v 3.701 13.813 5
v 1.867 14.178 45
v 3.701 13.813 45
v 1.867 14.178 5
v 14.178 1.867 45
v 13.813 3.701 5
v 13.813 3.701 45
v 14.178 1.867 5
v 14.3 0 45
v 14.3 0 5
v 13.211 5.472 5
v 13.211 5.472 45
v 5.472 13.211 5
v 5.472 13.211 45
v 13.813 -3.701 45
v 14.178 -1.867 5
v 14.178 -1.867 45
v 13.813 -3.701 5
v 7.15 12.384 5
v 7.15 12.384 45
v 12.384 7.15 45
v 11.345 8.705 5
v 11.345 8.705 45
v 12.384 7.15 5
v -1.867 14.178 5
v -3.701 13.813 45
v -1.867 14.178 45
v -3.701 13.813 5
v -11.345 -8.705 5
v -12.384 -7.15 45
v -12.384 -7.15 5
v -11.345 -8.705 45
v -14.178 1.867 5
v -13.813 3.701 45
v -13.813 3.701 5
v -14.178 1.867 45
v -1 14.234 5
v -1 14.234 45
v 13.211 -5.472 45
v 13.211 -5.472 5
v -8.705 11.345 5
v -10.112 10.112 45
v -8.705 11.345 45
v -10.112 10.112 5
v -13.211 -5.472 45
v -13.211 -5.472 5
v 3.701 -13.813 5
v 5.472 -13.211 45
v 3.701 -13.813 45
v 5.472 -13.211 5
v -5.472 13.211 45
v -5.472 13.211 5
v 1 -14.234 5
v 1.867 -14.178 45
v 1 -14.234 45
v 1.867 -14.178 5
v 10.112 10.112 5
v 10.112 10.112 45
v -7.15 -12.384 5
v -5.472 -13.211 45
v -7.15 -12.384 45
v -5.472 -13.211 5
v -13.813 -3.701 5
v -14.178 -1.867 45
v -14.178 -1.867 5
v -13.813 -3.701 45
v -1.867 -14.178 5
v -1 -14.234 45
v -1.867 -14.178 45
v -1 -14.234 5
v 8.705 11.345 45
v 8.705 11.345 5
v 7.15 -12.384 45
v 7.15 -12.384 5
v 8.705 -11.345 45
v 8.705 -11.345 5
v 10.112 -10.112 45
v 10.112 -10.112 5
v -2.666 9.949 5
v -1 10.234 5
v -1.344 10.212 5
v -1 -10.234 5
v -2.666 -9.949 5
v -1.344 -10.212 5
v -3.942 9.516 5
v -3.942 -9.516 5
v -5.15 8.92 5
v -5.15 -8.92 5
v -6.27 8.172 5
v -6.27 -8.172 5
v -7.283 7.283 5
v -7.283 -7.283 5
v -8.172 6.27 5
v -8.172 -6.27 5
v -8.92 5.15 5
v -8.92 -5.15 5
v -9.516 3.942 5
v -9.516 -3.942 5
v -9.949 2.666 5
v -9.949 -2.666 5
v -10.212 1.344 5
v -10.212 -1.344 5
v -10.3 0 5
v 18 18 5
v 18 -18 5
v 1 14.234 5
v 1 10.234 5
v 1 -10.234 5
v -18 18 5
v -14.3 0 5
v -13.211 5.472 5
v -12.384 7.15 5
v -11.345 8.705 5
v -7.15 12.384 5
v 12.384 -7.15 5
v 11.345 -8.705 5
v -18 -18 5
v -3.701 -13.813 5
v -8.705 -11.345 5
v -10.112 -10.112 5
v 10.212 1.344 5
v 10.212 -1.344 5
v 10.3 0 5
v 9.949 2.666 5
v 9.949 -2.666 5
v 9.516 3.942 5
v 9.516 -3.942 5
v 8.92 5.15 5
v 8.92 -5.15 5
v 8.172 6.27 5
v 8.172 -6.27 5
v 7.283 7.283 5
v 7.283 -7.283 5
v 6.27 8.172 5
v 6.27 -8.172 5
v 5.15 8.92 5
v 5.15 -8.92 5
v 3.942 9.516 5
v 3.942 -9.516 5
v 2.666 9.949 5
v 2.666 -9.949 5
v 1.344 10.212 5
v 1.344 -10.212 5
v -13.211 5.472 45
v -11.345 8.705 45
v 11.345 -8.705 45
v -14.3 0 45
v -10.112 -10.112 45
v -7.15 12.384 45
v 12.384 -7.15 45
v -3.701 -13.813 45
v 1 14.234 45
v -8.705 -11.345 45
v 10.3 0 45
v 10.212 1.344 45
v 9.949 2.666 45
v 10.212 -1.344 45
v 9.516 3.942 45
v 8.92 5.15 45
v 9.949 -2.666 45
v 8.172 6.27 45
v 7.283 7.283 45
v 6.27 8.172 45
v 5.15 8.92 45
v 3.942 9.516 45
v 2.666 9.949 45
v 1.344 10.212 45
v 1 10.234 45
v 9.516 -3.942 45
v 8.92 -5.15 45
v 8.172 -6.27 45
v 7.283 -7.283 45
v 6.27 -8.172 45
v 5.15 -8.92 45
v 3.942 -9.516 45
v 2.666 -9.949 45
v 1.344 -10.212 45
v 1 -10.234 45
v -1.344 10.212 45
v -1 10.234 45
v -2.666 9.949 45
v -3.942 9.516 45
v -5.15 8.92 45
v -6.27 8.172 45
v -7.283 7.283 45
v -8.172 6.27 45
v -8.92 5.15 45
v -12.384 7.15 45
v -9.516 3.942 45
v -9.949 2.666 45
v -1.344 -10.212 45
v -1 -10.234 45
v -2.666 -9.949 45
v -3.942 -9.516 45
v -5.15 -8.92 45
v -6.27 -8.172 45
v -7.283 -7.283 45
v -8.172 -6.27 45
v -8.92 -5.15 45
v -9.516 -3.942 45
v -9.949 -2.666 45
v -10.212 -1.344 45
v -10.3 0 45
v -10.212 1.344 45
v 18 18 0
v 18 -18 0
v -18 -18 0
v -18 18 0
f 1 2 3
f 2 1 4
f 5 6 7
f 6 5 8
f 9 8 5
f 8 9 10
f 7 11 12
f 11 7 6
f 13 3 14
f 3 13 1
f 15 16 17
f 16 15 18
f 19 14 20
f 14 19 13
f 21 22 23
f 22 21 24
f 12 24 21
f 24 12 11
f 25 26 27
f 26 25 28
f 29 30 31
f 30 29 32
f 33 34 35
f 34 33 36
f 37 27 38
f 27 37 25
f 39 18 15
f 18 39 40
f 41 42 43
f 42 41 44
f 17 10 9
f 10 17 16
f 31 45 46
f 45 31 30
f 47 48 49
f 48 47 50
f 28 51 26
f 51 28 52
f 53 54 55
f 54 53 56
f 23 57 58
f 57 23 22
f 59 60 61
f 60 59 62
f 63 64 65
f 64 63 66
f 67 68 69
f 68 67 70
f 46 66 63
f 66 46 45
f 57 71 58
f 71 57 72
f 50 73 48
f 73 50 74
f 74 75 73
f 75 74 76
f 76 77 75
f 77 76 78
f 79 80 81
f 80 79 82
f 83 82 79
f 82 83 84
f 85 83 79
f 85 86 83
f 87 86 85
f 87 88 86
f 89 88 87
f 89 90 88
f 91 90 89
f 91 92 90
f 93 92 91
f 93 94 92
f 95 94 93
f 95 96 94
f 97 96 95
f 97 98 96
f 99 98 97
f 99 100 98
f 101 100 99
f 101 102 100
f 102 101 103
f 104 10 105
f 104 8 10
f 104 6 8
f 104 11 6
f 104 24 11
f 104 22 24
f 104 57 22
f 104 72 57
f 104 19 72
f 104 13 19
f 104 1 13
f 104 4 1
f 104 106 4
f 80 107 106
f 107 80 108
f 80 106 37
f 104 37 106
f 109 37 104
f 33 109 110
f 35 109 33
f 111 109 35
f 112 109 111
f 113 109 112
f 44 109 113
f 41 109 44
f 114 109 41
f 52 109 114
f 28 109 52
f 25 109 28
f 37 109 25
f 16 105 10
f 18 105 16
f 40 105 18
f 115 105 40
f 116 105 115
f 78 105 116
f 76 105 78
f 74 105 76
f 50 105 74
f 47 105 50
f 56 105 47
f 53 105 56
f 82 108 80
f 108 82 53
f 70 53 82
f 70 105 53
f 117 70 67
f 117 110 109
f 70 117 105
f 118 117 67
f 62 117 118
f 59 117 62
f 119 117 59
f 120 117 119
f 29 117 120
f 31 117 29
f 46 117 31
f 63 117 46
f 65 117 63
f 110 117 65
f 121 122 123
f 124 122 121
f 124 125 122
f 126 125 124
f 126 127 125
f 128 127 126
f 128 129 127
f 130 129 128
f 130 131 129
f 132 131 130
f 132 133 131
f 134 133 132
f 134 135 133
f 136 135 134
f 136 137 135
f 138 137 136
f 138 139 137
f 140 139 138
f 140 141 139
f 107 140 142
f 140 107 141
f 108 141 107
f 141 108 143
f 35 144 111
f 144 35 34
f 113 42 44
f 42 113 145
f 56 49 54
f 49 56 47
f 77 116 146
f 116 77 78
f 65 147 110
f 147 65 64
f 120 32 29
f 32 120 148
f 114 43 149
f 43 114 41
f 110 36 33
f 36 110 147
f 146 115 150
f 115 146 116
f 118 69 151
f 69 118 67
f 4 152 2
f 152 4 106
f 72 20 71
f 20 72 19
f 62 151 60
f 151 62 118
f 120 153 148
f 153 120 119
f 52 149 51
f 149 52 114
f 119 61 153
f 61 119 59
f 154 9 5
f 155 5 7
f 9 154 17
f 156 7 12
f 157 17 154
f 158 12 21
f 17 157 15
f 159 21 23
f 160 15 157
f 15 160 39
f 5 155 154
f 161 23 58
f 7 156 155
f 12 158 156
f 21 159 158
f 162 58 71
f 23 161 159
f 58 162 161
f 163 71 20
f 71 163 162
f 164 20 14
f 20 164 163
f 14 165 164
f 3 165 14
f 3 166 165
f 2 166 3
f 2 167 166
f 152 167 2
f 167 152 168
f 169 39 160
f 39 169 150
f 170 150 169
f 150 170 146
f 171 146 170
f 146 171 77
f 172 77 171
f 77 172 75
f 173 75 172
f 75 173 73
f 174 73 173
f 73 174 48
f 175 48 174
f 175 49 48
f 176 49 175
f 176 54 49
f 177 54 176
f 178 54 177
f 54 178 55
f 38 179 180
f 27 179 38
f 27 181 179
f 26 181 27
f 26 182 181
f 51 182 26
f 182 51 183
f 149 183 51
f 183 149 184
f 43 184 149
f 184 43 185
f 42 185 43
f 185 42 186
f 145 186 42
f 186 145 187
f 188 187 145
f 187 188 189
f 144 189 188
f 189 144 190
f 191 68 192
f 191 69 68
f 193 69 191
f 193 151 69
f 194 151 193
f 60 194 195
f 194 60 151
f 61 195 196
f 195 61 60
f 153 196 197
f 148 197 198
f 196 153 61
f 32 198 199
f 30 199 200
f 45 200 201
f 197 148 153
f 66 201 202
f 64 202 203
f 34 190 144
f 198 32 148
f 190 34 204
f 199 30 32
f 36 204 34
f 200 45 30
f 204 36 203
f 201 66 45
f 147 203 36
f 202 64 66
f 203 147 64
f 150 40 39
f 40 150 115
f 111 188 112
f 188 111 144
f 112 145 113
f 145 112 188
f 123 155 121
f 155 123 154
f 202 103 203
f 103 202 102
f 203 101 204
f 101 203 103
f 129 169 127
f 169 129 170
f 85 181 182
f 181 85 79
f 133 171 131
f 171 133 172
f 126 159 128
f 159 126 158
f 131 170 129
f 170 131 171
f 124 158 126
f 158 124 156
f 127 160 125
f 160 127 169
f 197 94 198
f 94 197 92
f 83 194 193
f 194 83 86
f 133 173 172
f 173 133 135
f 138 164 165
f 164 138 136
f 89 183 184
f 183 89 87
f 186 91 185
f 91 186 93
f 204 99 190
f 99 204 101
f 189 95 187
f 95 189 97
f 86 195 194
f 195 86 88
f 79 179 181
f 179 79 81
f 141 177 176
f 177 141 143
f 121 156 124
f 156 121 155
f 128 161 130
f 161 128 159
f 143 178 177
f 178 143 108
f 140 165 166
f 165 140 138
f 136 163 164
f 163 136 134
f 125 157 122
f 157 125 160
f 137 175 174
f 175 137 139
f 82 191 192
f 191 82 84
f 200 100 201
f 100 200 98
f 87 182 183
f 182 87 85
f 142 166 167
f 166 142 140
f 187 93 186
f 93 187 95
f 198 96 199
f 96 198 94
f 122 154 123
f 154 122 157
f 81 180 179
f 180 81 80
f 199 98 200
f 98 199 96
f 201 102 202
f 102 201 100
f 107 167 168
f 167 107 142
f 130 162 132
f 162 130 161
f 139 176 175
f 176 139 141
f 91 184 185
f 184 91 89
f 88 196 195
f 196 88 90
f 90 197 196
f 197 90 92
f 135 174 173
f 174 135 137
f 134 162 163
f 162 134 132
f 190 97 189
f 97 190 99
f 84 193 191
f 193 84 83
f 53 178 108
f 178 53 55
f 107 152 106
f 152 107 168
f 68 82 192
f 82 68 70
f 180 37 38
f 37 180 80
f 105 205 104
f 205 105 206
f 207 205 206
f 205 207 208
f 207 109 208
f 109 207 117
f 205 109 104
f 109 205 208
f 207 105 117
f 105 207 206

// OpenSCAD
// Pipette mount — barrel clamp for digital-pipette-v2 on SO-101 wrist
// Port of hardware/cad/pipette_mount.py
// Regenerate: openscad -o hardware/stl/pipette_mount_so101.stl hardware/scad/pipette_mount.scad

// Parameters (mm)
BARREL_DIAMETER  = 20.0;
BARREL_CLEARANCE = 0.3;
CLAMP_LENGTH     = 40.0;
CLAMP_WALL       = 4.0;
MOUNT_WIDTH      = 36.0;
MOUNT_THICKNESS  = 5.0;
SPLIT_GAP        = 2.0;
SCREW_DIAMETER   = 3.2;  // M3 clearance

// Derived
BORE_D     = BARREL_DIAMETER + BARREL_CLEARANCE * 2;  // 20.6
CLAMP_OD   = BORE_D + CLAMP_WALL * 2;                 // 28.6
SCREW_OFFSET = CLAMP_OD / 2 + 3;                      // 17.3

union() {
    // Mounting plate
    translate([0, 0, MOUNT_THICKNESS / 2])
        cube([MOUNT_WIDTH, MOUNT_WIDTH, MOUNT_THICKNESS], center = true);

    // Clamp body with barrel hole and split gap
    translate([0, 0, MOUNT_THICKNESS])
        difference() {
            // Outer clamp cylinder
            cylinder(h = CLAMP_LENGTH, d = CLAMP_OD, $fn = 48);

            // Barrel bore
            translate([0, 0, -0.5])
                cylinder(h = CLAMP_LENGTH + 1, d = BORE_D, $fn = 48);

            // Split gap for tightening
            translate([-SPLIT_GAP / 2, -CLAMP_OD / 2 - 0.5, -0.5])
                cube([SPLIT_GAP, CLAMP_OD + 1, CLAMP_LENGTH + 1]);

            // Screw holes (2x, through the split ears)
            for (z_frac = [0.25, 0.75]) {
                translate([0, -SCREW_OFFSET - 5, CLAMP_LENGTH * z_frac])
                    rotate([90, 0, 90])
                        translate([0, 0, -MOUNT_WIDTH / 2])
                            cylinder(h = MOUNT_WIDTH, d = SCREW_DIAMETER, $fn = 24);
            }
        }
}
